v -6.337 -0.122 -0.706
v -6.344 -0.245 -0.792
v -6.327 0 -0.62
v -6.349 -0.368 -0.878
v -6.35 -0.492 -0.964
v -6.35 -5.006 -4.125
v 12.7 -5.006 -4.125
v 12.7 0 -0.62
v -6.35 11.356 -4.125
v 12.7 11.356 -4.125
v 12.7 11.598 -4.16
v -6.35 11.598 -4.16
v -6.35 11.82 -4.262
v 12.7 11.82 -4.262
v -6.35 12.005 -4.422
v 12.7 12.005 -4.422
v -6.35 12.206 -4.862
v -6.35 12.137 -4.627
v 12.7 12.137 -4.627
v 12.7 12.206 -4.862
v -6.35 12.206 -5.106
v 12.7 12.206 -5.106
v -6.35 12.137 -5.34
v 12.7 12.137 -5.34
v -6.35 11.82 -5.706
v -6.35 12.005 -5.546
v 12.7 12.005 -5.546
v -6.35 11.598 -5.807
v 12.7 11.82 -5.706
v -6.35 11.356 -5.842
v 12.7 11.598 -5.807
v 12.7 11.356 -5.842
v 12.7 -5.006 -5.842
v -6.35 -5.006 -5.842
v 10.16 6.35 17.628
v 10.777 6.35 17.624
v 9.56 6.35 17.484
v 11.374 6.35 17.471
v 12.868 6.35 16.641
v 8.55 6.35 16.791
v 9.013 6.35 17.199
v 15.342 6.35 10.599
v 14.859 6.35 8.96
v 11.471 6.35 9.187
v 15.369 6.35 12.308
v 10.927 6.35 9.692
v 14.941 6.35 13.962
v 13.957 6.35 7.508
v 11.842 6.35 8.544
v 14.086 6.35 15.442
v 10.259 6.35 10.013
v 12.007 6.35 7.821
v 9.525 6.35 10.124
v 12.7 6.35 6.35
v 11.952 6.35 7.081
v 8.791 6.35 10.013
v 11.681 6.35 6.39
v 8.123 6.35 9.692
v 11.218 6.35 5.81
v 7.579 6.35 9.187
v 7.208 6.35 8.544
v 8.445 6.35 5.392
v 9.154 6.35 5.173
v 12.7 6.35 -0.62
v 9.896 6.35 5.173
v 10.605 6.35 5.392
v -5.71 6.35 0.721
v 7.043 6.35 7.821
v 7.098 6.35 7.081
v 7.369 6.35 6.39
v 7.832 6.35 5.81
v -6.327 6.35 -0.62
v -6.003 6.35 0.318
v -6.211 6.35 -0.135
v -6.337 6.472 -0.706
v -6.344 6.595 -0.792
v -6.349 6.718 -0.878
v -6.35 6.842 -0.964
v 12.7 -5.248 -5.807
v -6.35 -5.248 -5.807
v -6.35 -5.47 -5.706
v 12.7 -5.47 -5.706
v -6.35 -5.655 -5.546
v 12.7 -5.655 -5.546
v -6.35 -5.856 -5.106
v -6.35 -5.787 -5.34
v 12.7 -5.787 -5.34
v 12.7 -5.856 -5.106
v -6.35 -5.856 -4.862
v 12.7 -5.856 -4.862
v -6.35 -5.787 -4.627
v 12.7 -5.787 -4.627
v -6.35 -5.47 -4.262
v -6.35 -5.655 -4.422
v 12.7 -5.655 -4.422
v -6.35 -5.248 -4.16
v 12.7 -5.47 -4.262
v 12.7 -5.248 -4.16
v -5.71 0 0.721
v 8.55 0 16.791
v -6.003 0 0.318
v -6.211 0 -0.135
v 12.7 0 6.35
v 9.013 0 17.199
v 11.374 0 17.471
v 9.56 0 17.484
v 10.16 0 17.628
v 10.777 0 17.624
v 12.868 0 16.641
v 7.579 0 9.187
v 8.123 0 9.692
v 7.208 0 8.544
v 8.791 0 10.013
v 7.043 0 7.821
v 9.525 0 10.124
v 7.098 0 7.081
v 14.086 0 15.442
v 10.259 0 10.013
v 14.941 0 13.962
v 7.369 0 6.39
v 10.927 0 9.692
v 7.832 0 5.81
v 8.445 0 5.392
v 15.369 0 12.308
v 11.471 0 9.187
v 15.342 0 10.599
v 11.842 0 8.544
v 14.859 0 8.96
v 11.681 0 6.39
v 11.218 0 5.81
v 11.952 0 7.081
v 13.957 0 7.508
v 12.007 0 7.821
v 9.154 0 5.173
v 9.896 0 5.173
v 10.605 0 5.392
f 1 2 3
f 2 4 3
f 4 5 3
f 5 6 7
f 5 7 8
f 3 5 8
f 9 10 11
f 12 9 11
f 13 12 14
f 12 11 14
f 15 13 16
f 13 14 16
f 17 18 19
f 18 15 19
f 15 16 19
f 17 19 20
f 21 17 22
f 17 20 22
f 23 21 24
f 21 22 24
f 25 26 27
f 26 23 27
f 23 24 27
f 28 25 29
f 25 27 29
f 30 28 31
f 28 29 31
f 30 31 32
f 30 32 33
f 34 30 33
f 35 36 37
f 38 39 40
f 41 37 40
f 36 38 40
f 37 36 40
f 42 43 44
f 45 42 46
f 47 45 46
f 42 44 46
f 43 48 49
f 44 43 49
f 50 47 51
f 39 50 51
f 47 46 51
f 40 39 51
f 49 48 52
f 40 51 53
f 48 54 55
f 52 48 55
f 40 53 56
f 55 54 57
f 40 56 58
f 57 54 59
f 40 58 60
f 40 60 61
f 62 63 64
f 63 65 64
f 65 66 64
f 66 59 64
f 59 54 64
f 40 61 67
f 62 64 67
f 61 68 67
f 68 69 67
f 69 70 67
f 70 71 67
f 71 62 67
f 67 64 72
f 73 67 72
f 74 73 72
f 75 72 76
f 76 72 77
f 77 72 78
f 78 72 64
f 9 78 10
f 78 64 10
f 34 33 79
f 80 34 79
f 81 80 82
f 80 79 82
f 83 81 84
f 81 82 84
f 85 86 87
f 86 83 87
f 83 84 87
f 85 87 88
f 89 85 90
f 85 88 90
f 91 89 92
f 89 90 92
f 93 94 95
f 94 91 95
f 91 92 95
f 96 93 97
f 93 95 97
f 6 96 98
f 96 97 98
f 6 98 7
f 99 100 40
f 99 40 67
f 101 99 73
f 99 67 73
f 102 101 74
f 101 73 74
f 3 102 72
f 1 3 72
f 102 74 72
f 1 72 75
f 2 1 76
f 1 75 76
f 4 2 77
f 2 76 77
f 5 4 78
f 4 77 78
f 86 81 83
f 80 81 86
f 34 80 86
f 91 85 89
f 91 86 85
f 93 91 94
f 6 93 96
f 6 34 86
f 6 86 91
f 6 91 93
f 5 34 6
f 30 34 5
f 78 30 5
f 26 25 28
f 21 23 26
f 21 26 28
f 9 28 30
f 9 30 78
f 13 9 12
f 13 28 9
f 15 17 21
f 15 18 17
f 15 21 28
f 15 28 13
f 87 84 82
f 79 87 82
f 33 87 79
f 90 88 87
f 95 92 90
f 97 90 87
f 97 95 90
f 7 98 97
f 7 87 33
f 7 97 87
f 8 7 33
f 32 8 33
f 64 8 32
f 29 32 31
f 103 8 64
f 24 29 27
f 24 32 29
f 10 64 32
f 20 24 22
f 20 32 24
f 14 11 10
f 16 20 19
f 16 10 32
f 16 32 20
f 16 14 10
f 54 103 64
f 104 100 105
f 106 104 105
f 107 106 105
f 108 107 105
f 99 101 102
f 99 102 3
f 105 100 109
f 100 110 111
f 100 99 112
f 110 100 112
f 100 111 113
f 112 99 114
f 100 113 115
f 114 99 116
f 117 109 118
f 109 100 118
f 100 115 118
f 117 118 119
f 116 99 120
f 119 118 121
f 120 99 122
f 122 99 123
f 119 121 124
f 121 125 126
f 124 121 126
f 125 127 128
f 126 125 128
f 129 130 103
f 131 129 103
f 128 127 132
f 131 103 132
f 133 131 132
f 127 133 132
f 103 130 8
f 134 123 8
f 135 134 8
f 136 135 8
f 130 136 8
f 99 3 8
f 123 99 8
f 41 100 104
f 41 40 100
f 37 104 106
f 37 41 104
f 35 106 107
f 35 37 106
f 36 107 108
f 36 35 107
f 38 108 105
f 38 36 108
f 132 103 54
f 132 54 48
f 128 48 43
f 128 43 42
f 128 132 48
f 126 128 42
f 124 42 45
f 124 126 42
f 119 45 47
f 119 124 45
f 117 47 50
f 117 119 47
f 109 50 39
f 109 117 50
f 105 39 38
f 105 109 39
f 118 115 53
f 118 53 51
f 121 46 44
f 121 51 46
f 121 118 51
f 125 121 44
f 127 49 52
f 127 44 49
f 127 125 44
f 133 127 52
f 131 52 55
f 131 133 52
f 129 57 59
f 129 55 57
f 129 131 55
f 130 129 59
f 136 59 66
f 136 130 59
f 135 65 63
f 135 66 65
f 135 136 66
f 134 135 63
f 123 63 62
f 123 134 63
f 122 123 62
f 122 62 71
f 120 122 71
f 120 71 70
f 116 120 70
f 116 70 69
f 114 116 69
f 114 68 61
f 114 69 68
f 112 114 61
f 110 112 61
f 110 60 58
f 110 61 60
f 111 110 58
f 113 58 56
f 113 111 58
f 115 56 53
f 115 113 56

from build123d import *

# Parameters (mm, degrees)
SKETCH1_R               = 2.4892
BOSS_EXTRUDE1_DEPTH     = 6.35
BOSS_EXTRUDE2_START     = -6.35
BOSS_EXTRUDE2_DEPTH     = 19.05
BOSS_EXTRUDE2_START_2   = -6.555460136
BOSS_EXTRUDE2_2_DEPTH   = 19.460920272
BOSS_EXTRUDE2_START_3   = -10
BOSS_EXTRUDE2_3_DEPTH   = 3.65
CUT_EXTRUDE1_DEPTH      = 27.910448217
CUT_EXTRUDE1_DEPTH_BACK = 27.910448217
SKETCH3_W               = 2.179354936
SKETCH3_H               = 6.35
CUT_EXTRUDE2_DEPTH      = 31.98795935
CUT_EXTRUDE2_DEPTH_BACK = 31.98795935
BOSS_EXTRUDE4_START     = -6.35
SKETCH8_R               = 2.4892
BOSS_EXTRUDE4_DEPTH     = 6.35
CUT_EXTRUDE3_DEPTH      = 27.585891059
CUT_EXTRUDE3_DEPTH_BACK = 27.585891059
SKETCH7_R               = 2.4892
CUT_EXTRUDE4_DEPTH      = 27.585891059
CUT_EXTRUDE4_DEPTH_BACK = 27.585891059
FILLET1_R               = 2.54


with BuildPart() as part:
    # Sketch1 → Boss-Extrude1 (new body)
    with BuildSketch(Plane(origin=(0, 0, 0), x_dir=(1, 0, 0), z_dir=(0, 1, 0))):
        with BuildLine():
            Line((9.525, -17.889269346), (-0.578271622, -16.817120786))
            Line((-0.578271622, -16.817120786), (-6.35, 0))
            Line((-6.35, 0), (12.7, 0))
            Line((12.7, 0), (12.7, -6.35))
            ThreePointArc((12.7, -6.35), (15.186560179, -13.240601753), (9.525, -17.889269346))
        make_face()
        with Locations(Location((9.525, -11.43, 0), (0, 0, 270))):
            Circle(SKETCH1_R, mode=Mode.SUBTRACT)
    extrude(amount=BOSS_EXTRUDE1_DEPTH)

    # Boss-Extrude2: read off the stored shape, not the designer's step
    # Boss-Extrude2 outline → Boss-Extrude2 (add)
    with BuildSketch(Plane.YZ.offset(BOSS_EXTRUDE2_START)):
        with BuildLine():
            ThreePointArc((11.551615481, -6.35), (12.905510296, -4.996105185), (11.551615481, -3.642210371))
            Line((11.551615481, -3.642210371), (6.35, 0))
            Line((6.35, 0), (0, 0))
            Line((0, 0), (-5.201615481, -3.642210371))
            ThreePointArc((-5.201615481, -3.642210371), (-6.555510296, -4.996105185), (-5.201615481, -6.35))
            Line((-5.201615481, -6.35), (11.551615481, -6.35))
        make_face()
    extrude(amount=BOSS_EXTRUDE2_DEPTH)

    # Boss-Extrude2 2 outline → Boss-Extrude2 2 (add)
    with BuildSketch(Plane(origin=(0, 0, 0), x_dir=(1, 0, 0), z_dir=(0, 1, 0)).offset(BOSS_EXTRUDE2_START_2)):
        Polygon((-8.529354936, 6.35), (-6.35, 0), (-6.35, 6.35), align=None)
    extrude(amount=BOSS_EXTRUDE2_2_DEPTH)

    # Boss-Extrude2 3 outline → Boss-Extrude2 3 (cut)
    with BuildSketch(Plane.YZ.offset(BOSS_EXTRUDE2_START_3)):
        with BuildLine():
            Line((12.905460136, 0), (6.35, 0))
            Line((6.35, 0), (11.551615481, -3.642210371))
            ThreePointArc((11.551615481, -3.642210371), (12.504834401, -4.034645431), (12.905460136, -4.984450993))
            Line((12.905460136, -4.984450993), (12.905460136, 0))
        make_face()
        with BuildLine():
            ThreePointArc((12.905460136, -5.007759378), (12.504834401, -5.95756494), (11.551615481, -6.35))
            Line((11.551615481, -6.35), (12.905460136, -6.35))
            Line((12.905460136, -6.35), (12.905460136, -5.007759378))
        make_face()
        with BuildLine():
            Line((0, 0), (-6.555460136, 0))
            Line((-6.555460136, 0), (-6.555460136, -4.984450993))
            ThreePointArc((-6.555460136, -4.984450993), (-6.154834401, -4.034645431), (-5.201615481, -3.642210371))
            Line((-5.201615481, -3.642210371), (0, 0))
        make_face()
        with BuildLine():
            ThreePointArc((-5.201615481, -6.35), (-6.154834401, -5.95756494), (-6.555460136, -5.007759378))
            Line((-6.555460136, -5.007759378), (-6.555460136, -6.35))
            Line((-6.555460136, -6.35), (-5.201615481, -6.35))
        make_face()
    extrude(amount=BOSS_EXTRUDE2_3_DEPTH, mode=Mode.SUBTRACT)

    # Sketch3 → Cut-Extrude1 (cut, two sides: drawn at the far end of the back side and taken through both)
    with BuildSketch(Plane.XZ.offset(-CUT_EXTRUDE1_DEPTH_BACK)):
        with Locations((-7.439677468, -3.175)):
            Rectangle(SKETCH3_W, SKETCH3_H)
    extrude(amount=CUT_EXTRUDE1_DEPTH + CUT_EXTRUDE1_DEPTH_BACK, mode=Mode.SUBTRACT)

    # Sketch4 → Cut-Extrude2 (cut, two sides: drawn at the far end of the back side and taken through both)
    with BuildSketch(Plane.ZY.offset(6.35).offset(-CUT_EXTRUDE2_DEPTH_BACK)):
        with BuildLine():
            ThreePointArc((-5.842, -5.006022622), (-4.983704134, -5.864318488), (-4.125408268, -5.006022622))
            Line((-4.125408268, -5.006022622), (-0.620153491, 0))
            Line((-0.620153491, 0), (0, 0))
            Line((0, 0), (-3.642210371, -5.201615481))
            ThreePointArc((-3.642210371, -5.201615481), (-4.996105185, -6.555510296), (-6.35, -5.201615481))
            Line((-6.35, -5.201615481), (-6.35, 11.551615481))
            ThreePointArc((-6.35, 11.551615481), (-4.996105185, 12.905510296), (-3.642210371, 11.551615481))
            Line((-3.642210371, 11.551615481), (0, 6.35))
            Line((0, 6.35), (-0.620153491, 6.35))
            Line((-0.620153491, 6.35), (-4.125408268, 11.356022622))
            ThreePointArc((-4.125408268, 11.356022622), (-4.983704134, 12.214318488), (-5.842, 11.356022622))
            Line((-5.842, 11.356022622), (-5.842, -5.006022622))
        make_face()
    extrude(amount=CUT_EXTRUDE2_DEPTH + CUT_EXTRUDE2_DEPTH_BACK, mode=Mode.SUBTRACT)

    # Sketch8 → Boss-Extrude4 (add)
    with BuildSketch(Plane(origin=(0, 6.35, 0), x_dir=(1, 0, 0), z_dir=(0, 1, 0)).offset(BOSS_EXTRUDE4_START)):
        with Locations((9.525, -11.43)):
            Circle(SKETCH8_R)
    extrude(amount=BOSS_EXTRUDE4_DEPTH)

    # Sketch7 → Cut-Extrude3 (cut, two sides: drawn at the far end of the back side and taken through both)
    with BuildSketch(Plane(origin=(0, 6.35, 0), x_dir=(1, 0, 0), z_dir=(0, 1, 0)).offset(-CUT_EXTRUDE3_DEPTH_BACK)):
        with Locations(Location((9.525, -7.634846509, 0), (0, 0, 270))):
            Circle(SKETCH7_R)
    extrude(amount=CUT_EXTRUDE3_DEPTH + CUT_EXTRUDE3_DEPTH_BACK, mode=Mode.SUBTRACT)

    # Sketch9 → Cut-Extrude4 (cut, two sides: drawn at the far end of the back side and taken through both)
    with BuildSketch(Plane(origin=(0, 6.35, 0), x_dir=(1, 0, 0), z_dir=(0, 1, 0)).offset(-CUT_EXTRUDE4_DEPTH_BACK)):
        Polygon((9.525, -17.889269346), (-6.35, 0), (-0.578271622, -16.817120786), align=None)
    extrude(amount=CUT_EXTRUDE4_DEPTH + CUT_EXTRUDE4_DEPTH_BACK, mode=Mode.SUBTRACT)

    # Fillet1
    fillet1_edges = [part.edges().sort_by_distance(p)[0] for p in [
        (9.525, 3.175, 17.889269346),
        (-6.35, 3.175, 0),
    ]]
    fillet(fillet1_edges, radius=FILLET1_R)


solid = part.part
